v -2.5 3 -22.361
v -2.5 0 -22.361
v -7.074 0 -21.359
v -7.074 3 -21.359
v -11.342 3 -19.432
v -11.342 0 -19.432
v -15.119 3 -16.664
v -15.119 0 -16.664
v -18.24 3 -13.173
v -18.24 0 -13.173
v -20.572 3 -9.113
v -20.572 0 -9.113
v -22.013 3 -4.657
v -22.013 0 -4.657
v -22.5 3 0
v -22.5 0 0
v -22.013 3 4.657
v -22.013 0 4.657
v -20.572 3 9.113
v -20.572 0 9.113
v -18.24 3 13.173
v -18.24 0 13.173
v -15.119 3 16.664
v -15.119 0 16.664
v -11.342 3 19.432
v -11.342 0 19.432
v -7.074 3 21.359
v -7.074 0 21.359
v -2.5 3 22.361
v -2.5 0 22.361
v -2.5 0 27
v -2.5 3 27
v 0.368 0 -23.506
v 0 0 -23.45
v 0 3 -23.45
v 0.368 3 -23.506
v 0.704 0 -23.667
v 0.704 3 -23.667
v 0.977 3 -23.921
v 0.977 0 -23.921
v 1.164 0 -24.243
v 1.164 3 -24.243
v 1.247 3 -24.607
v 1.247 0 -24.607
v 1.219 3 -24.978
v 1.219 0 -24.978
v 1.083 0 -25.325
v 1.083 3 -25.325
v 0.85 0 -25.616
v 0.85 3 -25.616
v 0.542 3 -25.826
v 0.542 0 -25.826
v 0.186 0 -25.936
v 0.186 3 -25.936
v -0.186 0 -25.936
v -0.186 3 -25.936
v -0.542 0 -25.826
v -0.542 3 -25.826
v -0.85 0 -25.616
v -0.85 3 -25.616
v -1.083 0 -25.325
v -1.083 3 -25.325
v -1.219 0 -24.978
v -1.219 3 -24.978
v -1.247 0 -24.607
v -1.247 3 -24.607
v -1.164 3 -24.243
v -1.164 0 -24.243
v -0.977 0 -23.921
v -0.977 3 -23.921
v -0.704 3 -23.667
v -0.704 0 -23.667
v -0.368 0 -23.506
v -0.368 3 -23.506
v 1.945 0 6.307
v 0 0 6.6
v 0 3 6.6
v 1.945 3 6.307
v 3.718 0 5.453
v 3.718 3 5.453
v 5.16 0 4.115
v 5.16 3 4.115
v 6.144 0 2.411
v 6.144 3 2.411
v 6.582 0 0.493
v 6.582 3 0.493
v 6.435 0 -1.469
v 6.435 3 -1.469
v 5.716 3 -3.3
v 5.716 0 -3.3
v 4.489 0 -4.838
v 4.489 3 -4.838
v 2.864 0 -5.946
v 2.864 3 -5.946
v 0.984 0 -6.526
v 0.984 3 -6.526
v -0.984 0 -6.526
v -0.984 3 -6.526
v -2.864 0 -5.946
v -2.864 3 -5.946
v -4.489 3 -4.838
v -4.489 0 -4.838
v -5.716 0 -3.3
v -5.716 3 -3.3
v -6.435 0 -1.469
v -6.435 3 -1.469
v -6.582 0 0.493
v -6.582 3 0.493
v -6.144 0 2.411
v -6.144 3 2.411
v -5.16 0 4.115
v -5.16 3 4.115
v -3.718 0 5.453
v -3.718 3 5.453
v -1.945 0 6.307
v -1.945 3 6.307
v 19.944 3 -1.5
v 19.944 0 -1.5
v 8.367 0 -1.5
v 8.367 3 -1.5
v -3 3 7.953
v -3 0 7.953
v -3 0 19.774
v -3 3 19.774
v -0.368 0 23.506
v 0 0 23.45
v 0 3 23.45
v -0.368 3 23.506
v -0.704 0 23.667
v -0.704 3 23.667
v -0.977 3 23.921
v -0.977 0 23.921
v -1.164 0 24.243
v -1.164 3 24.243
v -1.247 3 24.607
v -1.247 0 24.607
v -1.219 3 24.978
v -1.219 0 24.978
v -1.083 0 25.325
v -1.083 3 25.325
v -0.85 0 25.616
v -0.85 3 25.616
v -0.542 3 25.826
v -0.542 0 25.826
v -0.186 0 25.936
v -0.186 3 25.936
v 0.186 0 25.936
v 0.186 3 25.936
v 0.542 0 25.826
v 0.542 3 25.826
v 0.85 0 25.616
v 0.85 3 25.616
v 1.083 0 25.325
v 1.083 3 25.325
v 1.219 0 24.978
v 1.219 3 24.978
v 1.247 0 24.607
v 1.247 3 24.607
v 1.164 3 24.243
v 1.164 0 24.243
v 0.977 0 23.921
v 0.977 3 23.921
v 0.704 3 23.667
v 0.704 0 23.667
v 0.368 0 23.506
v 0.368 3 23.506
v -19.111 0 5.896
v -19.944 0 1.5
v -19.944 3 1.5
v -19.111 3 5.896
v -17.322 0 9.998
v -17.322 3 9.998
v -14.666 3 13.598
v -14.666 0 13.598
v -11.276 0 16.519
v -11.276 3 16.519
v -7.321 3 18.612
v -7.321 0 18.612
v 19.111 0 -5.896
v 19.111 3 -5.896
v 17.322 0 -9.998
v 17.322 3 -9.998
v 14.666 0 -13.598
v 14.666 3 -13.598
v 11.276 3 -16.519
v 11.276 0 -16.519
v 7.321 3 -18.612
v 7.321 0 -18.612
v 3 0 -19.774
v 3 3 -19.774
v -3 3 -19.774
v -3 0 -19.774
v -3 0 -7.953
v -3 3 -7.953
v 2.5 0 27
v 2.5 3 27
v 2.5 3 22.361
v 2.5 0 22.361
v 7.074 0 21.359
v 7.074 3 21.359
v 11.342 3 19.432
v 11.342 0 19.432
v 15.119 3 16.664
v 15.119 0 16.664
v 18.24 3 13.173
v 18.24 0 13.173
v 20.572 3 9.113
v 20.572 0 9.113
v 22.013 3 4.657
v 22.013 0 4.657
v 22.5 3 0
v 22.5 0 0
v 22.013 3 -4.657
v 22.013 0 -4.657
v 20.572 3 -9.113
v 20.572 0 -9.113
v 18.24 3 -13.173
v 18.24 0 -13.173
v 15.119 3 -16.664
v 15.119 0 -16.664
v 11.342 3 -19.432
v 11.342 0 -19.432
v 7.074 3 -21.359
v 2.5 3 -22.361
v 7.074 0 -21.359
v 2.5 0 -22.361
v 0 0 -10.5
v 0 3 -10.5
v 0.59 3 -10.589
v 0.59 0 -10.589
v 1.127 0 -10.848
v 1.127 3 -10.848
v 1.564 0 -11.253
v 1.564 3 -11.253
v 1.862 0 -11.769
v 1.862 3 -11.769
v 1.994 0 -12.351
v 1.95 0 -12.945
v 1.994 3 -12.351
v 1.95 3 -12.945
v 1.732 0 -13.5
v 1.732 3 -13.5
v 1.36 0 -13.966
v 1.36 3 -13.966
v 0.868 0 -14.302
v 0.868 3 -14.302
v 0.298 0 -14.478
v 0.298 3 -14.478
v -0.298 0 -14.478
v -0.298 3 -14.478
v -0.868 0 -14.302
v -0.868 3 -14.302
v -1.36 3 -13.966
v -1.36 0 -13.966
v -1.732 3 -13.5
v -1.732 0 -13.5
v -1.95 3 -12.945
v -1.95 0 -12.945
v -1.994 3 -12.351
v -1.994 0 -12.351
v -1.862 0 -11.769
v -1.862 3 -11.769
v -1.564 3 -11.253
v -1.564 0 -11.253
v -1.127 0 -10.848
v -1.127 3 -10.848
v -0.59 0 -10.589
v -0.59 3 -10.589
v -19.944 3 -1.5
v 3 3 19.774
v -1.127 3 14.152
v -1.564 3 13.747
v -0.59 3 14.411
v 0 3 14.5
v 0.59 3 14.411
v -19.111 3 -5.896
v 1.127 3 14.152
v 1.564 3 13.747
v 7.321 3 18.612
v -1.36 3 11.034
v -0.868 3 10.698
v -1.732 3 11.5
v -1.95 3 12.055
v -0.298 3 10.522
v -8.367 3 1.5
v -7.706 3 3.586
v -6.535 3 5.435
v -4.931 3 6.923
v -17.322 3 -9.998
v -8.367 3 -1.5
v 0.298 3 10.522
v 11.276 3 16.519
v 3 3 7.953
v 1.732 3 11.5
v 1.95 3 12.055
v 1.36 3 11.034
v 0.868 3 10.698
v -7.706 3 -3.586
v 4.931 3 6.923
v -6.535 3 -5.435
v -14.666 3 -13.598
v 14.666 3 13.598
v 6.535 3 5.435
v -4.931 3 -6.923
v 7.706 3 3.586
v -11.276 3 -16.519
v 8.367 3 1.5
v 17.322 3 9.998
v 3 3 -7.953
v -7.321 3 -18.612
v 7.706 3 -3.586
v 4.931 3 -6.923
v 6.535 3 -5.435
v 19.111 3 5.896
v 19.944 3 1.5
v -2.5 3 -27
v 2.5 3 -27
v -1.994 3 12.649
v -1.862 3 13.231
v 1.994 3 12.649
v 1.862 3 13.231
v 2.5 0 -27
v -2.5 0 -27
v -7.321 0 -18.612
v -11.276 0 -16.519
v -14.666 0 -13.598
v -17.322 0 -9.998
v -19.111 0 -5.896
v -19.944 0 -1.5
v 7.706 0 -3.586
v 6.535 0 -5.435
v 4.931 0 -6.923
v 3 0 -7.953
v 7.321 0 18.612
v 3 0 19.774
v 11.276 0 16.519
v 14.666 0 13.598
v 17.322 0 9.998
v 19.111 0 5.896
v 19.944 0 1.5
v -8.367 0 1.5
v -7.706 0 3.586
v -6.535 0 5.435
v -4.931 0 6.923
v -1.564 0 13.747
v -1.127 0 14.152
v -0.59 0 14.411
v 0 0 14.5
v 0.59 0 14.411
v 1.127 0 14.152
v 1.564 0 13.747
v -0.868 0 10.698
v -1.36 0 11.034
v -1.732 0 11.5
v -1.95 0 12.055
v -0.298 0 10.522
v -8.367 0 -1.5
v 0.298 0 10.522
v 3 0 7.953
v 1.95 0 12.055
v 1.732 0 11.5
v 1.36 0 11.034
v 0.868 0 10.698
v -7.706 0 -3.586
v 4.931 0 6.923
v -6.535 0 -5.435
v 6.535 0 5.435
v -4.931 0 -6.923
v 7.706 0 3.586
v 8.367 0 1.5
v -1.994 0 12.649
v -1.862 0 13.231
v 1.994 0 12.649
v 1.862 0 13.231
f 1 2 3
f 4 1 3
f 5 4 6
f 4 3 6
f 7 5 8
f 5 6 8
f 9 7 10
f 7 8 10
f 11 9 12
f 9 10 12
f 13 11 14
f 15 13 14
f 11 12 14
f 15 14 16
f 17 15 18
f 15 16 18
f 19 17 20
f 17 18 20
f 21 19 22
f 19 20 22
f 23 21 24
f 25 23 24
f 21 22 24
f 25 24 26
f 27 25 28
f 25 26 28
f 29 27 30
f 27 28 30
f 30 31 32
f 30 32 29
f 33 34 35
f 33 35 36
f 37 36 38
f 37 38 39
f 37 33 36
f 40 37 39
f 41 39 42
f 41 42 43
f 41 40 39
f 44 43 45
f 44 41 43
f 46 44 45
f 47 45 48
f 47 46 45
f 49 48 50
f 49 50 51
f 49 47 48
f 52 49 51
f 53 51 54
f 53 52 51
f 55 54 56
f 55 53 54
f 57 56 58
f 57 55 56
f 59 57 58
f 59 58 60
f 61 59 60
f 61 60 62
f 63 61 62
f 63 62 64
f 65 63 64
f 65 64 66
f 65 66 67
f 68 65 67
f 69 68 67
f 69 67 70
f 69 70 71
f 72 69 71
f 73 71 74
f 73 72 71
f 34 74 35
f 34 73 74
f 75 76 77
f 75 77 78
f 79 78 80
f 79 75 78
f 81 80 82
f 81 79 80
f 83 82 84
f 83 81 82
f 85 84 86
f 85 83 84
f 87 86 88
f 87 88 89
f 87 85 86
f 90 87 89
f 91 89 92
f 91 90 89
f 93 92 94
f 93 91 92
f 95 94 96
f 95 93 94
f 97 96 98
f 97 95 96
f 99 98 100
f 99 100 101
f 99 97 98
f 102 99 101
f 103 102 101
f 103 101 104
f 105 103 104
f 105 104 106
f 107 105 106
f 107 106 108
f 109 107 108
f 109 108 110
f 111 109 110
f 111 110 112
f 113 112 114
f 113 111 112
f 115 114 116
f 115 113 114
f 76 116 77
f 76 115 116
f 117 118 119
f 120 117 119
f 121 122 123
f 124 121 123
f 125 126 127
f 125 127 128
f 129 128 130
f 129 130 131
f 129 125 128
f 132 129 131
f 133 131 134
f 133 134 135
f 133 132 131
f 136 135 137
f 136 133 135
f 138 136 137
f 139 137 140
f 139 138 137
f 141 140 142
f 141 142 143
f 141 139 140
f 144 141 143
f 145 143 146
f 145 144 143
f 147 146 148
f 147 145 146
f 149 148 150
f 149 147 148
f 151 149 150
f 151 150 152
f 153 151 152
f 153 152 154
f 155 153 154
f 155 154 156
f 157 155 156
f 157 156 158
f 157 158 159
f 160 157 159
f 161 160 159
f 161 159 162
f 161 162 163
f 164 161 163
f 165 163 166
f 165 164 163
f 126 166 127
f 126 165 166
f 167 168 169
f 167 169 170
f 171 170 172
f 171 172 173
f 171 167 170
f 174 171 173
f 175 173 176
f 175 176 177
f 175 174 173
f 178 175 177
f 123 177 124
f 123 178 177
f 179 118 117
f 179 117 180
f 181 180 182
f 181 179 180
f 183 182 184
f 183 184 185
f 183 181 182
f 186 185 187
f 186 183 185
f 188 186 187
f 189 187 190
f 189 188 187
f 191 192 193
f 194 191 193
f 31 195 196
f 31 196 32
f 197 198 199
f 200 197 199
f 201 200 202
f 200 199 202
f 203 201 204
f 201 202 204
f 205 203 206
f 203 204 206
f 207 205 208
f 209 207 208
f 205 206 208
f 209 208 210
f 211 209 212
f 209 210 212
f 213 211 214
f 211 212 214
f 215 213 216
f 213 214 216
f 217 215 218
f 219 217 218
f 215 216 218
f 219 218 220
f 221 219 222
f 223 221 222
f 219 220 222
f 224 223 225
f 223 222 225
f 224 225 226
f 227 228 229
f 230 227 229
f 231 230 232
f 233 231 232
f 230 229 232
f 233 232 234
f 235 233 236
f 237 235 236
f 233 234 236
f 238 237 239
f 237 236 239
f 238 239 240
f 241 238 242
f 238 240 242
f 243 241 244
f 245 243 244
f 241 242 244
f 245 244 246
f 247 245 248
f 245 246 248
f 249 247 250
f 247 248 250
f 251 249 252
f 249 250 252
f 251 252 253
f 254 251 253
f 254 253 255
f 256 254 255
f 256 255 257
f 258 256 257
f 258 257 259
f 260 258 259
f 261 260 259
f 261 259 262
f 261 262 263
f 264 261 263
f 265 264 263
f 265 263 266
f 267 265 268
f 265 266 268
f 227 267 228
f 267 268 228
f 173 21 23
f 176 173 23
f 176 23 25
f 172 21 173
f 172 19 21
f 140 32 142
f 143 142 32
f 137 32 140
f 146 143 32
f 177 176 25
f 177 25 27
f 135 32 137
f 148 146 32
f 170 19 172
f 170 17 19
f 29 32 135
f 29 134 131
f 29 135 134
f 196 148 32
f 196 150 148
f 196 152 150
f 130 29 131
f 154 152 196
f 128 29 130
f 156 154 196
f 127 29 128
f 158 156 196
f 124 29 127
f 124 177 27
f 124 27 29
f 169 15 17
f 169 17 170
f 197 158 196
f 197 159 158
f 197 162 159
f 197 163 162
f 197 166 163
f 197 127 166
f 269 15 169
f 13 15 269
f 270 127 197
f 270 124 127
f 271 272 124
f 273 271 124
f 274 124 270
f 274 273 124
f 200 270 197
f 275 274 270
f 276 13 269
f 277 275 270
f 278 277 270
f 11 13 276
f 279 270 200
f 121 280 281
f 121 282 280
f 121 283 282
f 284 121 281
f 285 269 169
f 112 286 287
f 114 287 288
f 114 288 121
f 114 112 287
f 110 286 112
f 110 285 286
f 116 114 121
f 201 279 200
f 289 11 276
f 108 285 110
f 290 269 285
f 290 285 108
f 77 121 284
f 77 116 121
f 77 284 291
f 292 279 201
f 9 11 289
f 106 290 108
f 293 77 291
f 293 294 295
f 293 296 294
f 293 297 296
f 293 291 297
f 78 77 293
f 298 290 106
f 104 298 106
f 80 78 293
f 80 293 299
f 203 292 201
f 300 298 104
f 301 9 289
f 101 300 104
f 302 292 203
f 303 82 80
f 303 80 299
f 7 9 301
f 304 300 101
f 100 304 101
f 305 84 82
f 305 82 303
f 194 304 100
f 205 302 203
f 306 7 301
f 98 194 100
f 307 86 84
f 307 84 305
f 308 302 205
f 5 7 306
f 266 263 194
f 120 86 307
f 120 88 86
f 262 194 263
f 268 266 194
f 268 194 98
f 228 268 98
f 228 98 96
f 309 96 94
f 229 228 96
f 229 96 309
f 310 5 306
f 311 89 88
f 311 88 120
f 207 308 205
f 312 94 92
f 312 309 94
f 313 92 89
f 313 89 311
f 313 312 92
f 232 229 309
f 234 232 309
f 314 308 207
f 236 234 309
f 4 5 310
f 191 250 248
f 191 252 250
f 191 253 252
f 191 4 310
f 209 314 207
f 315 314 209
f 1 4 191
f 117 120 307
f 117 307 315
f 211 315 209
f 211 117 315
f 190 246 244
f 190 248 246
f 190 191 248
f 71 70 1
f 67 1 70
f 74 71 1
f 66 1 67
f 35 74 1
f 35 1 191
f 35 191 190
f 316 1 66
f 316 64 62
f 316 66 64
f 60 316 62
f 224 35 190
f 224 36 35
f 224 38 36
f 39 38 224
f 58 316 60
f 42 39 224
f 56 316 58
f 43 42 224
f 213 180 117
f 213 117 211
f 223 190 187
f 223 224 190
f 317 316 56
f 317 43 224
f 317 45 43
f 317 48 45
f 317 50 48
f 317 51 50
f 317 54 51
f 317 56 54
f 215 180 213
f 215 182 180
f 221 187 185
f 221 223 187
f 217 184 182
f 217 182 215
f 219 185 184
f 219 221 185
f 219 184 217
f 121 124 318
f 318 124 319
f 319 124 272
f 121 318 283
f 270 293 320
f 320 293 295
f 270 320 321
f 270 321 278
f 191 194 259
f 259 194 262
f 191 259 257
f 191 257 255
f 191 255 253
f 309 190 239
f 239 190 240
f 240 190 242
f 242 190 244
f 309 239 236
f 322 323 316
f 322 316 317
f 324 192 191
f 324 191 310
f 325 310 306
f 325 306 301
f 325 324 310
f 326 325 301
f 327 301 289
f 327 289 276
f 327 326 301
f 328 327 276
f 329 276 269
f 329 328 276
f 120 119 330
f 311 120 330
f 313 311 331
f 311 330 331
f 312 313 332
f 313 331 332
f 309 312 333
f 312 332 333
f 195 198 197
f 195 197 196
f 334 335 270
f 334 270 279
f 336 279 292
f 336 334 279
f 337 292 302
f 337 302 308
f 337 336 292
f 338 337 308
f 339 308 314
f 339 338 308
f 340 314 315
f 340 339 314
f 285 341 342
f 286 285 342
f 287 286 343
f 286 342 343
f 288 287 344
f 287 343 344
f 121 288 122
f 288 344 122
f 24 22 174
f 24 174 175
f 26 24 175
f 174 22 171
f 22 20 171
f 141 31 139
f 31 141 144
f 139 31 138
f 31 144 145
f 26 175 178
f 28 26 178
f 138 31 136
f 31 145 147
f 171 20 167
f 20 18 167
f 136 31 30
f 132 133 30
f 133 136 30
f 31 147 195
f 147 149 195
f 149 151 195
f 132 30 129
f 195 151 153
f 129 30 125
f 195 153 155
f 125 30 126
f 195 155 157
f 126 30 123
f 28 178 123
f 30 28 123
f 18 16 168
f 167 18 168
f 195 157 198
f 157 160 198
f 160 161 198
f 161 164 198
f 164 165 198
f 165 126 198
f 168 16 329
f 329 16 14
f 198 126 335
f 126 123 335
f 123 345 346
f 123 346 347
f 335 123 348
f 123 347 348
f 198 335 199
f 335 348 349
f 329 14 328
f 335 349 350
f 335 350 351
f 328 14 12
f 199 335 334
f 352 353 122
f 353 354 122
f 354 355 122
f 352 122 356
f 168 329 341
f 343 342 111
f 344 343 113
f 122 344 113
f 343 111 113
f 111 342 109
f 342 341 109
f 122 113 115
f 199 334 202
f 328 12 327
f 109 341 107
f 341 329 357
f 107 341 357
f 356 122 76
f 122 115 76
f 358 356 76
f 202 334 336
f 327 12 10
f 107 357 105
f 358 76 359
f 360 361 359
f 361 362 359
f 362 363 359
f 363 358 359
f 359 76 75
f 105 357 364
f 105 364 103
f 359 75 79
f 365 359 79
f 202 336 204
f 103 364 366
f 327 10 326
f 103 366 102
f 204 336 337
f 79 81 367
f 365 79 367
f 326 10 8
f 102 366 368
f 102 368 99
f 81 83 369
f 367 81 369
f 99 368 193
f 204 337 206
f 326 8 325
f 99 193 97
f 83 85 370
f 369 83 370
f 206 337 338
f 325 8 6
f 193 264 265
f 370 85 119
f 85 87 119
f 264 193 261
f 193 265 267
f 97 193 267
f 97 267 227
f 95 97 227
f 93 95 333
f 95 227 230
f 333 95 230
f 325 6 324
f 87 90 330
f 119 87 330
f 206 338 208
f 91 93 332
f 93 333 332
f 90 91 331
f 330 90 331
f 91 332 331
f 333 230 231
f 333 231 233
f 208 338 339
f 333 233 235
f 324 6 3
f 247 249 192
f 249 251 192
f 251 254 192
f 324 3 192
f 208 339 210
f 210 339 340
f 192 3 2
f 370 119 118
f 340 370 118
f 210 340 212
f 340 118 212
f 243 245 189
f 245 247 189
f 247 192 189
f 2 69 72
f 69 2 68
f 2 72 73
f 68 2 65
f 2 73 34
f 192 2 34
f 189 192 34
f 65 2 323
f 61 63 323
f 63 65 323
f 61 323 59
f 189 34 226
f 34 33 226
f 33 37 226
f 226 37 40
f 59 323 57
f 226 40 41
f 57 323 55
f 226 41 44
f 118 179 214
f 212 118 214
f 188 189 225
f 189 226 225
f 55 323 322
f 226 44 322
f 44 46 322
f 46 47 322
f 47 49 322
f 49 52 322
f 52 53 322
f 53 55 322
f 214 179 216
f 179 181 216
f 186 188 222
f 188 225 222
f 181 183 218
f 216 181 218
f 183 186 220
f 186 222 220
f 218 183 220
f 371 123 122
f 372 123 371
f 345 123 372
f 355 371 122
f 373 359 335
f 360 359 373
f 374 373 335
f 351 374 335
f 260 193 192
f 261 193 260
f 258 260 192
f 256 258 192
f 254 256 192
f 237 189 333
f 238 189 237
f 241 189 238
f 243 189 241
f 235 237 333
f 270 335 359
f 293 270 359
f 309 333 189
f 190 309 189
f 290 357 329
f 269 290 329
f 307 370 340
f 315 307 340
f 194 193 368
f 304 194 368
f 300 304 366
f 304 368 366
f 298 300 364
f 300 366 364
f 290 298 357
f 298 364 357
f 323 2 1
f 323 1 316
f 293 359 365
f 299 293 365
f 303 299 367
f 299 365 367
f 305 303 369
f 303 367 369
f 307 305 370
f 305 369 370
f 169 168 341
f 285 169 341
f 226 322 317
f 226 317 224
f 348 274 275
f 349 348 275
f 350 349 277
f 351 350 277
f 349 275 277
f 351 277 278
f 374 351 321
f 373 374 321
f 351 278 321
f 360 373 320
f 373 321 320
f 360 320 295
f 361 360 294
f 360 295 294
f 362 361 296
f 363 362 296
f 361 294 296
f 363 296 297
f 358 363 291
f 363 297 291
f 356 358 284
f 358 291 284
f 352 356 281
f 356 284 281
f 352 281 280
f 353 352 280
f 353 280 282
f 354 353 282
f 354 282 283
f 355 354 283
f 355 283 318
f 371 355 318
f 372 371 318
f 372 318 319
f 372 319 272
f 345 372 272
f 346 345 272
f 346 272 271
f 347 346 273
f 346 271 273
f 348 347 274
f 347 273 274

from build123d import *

# Parameters (mm, degrees)
SKETCH1_R           = 22.5
SKETCH1_R_2         = 20
BOSS_EXTRUDE1_DEPTH = 3
SKETCH2_R           = 1.25
BOSS_EXTRUDE2_DEPTH = 3
CIRPATTERN1_COUNT   = 2
SKETCH3_R           = 6.6
BOSS_EXTRUDE3_DEPTH = 3
SKETCH4_R           = 2
CUT_EXTRUDE1_DEPTH  = 3


with BuildPart() as part:
    # Sketch1 → Boss-Extrude1 (new body)
    with BuildSketch(Plane(origin=(0, 0, 0), x_dir=(1, 0, 0), z_dir=(0, 1, 0))):
        with Locations(Location((0, 0, 0), (0, 0, 270))):
            Circle(SKETCH1_R)
        with Locations(Location((0, 0, 0), (0, 0, 270))):
            Circle(SKETCH1_R_2, mode=Mode.SUBTRACT)
    extrude(amount=BOSS_EXTRUDE1_DEPTH)

    # Sketch2 → Boss-Extrude2 (add)
    with BuildSketch(Plane(origin=(0, 0, 0), x_dir=(1, 0, 0), z_dir=(0, 1, 0))):
        with BuildLine():
            Line((-2.5, 27), (2.5, 27))
            Line((2.5, 27), (2.5, 22.360679775))
            ThreePointArc((2.5, 22.360679775), (0, 22.5), (-2.5, 22.360679775))
            Line((-2.5, 22.360679775), (-2.5, 27))
        make_face()
        with Locations(Location((0, 24.7, 0), (0, 0, 270))):
            Circle(SKETCH2_R, mode=Mode.SUBTRACT)
    boss_extrude2 = extrude(amount=BOSS_EXTRUDE2_DEPTH)

    # CirPattern1: Boss-Extrude2 ×2 about axis
    cirpattern1_axis = Axis((0, 0, 0), (0, 1, 0))
    for i in range(1, CIRPATTERN1_COUNT):
        add(boss_extrude2.rotate(cirpattern1_axis, i * 360 / CIRPATTERN1_COUNT))

    # Sketch3 → Boss-Extrude3 (add)
    with BuildSketch(Plane(origin=(0, 0, 0), x_dir=(1, 0, 0), z_dir=(0, 1, 0))):
        with BuildLine():
            Line((-3, 19.773719933), (-3, 7.95298686))
            ThreePointArc((-3, 7.95298686), (-6.535301084, 5.435056554), (-8.366600265, 1.5))
            Line((-8.366600265, 1.5), (-19.943670675, 1.5))
            ThreePointArc((-19.943670675, 1.5), (-20, 0), (-19.943670675, -1.5))
            Line((-19.943670675, -1.5), (-8.366600265, -1.5))
            ThreePointArc((-8.366600265, -1.5), (-6.535301084, -5.435056554), (-3, -7.95298686))
            Line((-3, -7.95298686), (-3, -19.773719933))
            ThreePointArc((-3, -19.773719933), (0, -20), (3, -19.773719933))
            Line((3, -19.773719933), (3, -7.95298686))
            ThreePointArc((3, -7.95298686), (6.535301084, -5.435056554), (8.366600265, -1.5))
            Line((8.366600265, -1.5), (19.943670675, -1.5))
            ThreePointArc((19.943670675, -1.5), (20, 0), (19.943670675, 1.5))
            Line((19.943670675, 1.5), (8.366600265, 1.5))
            ThreePointArc((8.366600265, 1.5), (6.535301084, 5.435056554), (3, 7.95298686))
            Line((3, 7.95298686), (3, 19.773719933))
            ThreePointArc((3, 19.773719933), (0, 20), (-3, 19.773719933))
        make_face()
        with Locations(Location((0, 0, 0), (0, 0, 270))):
            Circle(SKETCH3_R, mode=Mode.SUBTRACT)
    extrude(amount=BOSS_EXTRUDE3_DEPTH)

    # Sketch4 → Cut-Extrude1 (cut)
    with BuildSketch(Plane(origin=(0, 3, 0), x_dir=(1, 0, 0), z_dir=(0, 1, 0))):
        with Locations(Location((0, 12.5, 0), (0, 0, 270))):
            Circle(SKETCH4_R)
        with Locations(Location((0, -12.5, 0), (0, 0, 270))):
            Circle(SKETCH4_R)
    extrude(amount=-CUT_EXTRUDE1_DEPTH, mode=Mode.SUBTRACT)


solid = part.part
